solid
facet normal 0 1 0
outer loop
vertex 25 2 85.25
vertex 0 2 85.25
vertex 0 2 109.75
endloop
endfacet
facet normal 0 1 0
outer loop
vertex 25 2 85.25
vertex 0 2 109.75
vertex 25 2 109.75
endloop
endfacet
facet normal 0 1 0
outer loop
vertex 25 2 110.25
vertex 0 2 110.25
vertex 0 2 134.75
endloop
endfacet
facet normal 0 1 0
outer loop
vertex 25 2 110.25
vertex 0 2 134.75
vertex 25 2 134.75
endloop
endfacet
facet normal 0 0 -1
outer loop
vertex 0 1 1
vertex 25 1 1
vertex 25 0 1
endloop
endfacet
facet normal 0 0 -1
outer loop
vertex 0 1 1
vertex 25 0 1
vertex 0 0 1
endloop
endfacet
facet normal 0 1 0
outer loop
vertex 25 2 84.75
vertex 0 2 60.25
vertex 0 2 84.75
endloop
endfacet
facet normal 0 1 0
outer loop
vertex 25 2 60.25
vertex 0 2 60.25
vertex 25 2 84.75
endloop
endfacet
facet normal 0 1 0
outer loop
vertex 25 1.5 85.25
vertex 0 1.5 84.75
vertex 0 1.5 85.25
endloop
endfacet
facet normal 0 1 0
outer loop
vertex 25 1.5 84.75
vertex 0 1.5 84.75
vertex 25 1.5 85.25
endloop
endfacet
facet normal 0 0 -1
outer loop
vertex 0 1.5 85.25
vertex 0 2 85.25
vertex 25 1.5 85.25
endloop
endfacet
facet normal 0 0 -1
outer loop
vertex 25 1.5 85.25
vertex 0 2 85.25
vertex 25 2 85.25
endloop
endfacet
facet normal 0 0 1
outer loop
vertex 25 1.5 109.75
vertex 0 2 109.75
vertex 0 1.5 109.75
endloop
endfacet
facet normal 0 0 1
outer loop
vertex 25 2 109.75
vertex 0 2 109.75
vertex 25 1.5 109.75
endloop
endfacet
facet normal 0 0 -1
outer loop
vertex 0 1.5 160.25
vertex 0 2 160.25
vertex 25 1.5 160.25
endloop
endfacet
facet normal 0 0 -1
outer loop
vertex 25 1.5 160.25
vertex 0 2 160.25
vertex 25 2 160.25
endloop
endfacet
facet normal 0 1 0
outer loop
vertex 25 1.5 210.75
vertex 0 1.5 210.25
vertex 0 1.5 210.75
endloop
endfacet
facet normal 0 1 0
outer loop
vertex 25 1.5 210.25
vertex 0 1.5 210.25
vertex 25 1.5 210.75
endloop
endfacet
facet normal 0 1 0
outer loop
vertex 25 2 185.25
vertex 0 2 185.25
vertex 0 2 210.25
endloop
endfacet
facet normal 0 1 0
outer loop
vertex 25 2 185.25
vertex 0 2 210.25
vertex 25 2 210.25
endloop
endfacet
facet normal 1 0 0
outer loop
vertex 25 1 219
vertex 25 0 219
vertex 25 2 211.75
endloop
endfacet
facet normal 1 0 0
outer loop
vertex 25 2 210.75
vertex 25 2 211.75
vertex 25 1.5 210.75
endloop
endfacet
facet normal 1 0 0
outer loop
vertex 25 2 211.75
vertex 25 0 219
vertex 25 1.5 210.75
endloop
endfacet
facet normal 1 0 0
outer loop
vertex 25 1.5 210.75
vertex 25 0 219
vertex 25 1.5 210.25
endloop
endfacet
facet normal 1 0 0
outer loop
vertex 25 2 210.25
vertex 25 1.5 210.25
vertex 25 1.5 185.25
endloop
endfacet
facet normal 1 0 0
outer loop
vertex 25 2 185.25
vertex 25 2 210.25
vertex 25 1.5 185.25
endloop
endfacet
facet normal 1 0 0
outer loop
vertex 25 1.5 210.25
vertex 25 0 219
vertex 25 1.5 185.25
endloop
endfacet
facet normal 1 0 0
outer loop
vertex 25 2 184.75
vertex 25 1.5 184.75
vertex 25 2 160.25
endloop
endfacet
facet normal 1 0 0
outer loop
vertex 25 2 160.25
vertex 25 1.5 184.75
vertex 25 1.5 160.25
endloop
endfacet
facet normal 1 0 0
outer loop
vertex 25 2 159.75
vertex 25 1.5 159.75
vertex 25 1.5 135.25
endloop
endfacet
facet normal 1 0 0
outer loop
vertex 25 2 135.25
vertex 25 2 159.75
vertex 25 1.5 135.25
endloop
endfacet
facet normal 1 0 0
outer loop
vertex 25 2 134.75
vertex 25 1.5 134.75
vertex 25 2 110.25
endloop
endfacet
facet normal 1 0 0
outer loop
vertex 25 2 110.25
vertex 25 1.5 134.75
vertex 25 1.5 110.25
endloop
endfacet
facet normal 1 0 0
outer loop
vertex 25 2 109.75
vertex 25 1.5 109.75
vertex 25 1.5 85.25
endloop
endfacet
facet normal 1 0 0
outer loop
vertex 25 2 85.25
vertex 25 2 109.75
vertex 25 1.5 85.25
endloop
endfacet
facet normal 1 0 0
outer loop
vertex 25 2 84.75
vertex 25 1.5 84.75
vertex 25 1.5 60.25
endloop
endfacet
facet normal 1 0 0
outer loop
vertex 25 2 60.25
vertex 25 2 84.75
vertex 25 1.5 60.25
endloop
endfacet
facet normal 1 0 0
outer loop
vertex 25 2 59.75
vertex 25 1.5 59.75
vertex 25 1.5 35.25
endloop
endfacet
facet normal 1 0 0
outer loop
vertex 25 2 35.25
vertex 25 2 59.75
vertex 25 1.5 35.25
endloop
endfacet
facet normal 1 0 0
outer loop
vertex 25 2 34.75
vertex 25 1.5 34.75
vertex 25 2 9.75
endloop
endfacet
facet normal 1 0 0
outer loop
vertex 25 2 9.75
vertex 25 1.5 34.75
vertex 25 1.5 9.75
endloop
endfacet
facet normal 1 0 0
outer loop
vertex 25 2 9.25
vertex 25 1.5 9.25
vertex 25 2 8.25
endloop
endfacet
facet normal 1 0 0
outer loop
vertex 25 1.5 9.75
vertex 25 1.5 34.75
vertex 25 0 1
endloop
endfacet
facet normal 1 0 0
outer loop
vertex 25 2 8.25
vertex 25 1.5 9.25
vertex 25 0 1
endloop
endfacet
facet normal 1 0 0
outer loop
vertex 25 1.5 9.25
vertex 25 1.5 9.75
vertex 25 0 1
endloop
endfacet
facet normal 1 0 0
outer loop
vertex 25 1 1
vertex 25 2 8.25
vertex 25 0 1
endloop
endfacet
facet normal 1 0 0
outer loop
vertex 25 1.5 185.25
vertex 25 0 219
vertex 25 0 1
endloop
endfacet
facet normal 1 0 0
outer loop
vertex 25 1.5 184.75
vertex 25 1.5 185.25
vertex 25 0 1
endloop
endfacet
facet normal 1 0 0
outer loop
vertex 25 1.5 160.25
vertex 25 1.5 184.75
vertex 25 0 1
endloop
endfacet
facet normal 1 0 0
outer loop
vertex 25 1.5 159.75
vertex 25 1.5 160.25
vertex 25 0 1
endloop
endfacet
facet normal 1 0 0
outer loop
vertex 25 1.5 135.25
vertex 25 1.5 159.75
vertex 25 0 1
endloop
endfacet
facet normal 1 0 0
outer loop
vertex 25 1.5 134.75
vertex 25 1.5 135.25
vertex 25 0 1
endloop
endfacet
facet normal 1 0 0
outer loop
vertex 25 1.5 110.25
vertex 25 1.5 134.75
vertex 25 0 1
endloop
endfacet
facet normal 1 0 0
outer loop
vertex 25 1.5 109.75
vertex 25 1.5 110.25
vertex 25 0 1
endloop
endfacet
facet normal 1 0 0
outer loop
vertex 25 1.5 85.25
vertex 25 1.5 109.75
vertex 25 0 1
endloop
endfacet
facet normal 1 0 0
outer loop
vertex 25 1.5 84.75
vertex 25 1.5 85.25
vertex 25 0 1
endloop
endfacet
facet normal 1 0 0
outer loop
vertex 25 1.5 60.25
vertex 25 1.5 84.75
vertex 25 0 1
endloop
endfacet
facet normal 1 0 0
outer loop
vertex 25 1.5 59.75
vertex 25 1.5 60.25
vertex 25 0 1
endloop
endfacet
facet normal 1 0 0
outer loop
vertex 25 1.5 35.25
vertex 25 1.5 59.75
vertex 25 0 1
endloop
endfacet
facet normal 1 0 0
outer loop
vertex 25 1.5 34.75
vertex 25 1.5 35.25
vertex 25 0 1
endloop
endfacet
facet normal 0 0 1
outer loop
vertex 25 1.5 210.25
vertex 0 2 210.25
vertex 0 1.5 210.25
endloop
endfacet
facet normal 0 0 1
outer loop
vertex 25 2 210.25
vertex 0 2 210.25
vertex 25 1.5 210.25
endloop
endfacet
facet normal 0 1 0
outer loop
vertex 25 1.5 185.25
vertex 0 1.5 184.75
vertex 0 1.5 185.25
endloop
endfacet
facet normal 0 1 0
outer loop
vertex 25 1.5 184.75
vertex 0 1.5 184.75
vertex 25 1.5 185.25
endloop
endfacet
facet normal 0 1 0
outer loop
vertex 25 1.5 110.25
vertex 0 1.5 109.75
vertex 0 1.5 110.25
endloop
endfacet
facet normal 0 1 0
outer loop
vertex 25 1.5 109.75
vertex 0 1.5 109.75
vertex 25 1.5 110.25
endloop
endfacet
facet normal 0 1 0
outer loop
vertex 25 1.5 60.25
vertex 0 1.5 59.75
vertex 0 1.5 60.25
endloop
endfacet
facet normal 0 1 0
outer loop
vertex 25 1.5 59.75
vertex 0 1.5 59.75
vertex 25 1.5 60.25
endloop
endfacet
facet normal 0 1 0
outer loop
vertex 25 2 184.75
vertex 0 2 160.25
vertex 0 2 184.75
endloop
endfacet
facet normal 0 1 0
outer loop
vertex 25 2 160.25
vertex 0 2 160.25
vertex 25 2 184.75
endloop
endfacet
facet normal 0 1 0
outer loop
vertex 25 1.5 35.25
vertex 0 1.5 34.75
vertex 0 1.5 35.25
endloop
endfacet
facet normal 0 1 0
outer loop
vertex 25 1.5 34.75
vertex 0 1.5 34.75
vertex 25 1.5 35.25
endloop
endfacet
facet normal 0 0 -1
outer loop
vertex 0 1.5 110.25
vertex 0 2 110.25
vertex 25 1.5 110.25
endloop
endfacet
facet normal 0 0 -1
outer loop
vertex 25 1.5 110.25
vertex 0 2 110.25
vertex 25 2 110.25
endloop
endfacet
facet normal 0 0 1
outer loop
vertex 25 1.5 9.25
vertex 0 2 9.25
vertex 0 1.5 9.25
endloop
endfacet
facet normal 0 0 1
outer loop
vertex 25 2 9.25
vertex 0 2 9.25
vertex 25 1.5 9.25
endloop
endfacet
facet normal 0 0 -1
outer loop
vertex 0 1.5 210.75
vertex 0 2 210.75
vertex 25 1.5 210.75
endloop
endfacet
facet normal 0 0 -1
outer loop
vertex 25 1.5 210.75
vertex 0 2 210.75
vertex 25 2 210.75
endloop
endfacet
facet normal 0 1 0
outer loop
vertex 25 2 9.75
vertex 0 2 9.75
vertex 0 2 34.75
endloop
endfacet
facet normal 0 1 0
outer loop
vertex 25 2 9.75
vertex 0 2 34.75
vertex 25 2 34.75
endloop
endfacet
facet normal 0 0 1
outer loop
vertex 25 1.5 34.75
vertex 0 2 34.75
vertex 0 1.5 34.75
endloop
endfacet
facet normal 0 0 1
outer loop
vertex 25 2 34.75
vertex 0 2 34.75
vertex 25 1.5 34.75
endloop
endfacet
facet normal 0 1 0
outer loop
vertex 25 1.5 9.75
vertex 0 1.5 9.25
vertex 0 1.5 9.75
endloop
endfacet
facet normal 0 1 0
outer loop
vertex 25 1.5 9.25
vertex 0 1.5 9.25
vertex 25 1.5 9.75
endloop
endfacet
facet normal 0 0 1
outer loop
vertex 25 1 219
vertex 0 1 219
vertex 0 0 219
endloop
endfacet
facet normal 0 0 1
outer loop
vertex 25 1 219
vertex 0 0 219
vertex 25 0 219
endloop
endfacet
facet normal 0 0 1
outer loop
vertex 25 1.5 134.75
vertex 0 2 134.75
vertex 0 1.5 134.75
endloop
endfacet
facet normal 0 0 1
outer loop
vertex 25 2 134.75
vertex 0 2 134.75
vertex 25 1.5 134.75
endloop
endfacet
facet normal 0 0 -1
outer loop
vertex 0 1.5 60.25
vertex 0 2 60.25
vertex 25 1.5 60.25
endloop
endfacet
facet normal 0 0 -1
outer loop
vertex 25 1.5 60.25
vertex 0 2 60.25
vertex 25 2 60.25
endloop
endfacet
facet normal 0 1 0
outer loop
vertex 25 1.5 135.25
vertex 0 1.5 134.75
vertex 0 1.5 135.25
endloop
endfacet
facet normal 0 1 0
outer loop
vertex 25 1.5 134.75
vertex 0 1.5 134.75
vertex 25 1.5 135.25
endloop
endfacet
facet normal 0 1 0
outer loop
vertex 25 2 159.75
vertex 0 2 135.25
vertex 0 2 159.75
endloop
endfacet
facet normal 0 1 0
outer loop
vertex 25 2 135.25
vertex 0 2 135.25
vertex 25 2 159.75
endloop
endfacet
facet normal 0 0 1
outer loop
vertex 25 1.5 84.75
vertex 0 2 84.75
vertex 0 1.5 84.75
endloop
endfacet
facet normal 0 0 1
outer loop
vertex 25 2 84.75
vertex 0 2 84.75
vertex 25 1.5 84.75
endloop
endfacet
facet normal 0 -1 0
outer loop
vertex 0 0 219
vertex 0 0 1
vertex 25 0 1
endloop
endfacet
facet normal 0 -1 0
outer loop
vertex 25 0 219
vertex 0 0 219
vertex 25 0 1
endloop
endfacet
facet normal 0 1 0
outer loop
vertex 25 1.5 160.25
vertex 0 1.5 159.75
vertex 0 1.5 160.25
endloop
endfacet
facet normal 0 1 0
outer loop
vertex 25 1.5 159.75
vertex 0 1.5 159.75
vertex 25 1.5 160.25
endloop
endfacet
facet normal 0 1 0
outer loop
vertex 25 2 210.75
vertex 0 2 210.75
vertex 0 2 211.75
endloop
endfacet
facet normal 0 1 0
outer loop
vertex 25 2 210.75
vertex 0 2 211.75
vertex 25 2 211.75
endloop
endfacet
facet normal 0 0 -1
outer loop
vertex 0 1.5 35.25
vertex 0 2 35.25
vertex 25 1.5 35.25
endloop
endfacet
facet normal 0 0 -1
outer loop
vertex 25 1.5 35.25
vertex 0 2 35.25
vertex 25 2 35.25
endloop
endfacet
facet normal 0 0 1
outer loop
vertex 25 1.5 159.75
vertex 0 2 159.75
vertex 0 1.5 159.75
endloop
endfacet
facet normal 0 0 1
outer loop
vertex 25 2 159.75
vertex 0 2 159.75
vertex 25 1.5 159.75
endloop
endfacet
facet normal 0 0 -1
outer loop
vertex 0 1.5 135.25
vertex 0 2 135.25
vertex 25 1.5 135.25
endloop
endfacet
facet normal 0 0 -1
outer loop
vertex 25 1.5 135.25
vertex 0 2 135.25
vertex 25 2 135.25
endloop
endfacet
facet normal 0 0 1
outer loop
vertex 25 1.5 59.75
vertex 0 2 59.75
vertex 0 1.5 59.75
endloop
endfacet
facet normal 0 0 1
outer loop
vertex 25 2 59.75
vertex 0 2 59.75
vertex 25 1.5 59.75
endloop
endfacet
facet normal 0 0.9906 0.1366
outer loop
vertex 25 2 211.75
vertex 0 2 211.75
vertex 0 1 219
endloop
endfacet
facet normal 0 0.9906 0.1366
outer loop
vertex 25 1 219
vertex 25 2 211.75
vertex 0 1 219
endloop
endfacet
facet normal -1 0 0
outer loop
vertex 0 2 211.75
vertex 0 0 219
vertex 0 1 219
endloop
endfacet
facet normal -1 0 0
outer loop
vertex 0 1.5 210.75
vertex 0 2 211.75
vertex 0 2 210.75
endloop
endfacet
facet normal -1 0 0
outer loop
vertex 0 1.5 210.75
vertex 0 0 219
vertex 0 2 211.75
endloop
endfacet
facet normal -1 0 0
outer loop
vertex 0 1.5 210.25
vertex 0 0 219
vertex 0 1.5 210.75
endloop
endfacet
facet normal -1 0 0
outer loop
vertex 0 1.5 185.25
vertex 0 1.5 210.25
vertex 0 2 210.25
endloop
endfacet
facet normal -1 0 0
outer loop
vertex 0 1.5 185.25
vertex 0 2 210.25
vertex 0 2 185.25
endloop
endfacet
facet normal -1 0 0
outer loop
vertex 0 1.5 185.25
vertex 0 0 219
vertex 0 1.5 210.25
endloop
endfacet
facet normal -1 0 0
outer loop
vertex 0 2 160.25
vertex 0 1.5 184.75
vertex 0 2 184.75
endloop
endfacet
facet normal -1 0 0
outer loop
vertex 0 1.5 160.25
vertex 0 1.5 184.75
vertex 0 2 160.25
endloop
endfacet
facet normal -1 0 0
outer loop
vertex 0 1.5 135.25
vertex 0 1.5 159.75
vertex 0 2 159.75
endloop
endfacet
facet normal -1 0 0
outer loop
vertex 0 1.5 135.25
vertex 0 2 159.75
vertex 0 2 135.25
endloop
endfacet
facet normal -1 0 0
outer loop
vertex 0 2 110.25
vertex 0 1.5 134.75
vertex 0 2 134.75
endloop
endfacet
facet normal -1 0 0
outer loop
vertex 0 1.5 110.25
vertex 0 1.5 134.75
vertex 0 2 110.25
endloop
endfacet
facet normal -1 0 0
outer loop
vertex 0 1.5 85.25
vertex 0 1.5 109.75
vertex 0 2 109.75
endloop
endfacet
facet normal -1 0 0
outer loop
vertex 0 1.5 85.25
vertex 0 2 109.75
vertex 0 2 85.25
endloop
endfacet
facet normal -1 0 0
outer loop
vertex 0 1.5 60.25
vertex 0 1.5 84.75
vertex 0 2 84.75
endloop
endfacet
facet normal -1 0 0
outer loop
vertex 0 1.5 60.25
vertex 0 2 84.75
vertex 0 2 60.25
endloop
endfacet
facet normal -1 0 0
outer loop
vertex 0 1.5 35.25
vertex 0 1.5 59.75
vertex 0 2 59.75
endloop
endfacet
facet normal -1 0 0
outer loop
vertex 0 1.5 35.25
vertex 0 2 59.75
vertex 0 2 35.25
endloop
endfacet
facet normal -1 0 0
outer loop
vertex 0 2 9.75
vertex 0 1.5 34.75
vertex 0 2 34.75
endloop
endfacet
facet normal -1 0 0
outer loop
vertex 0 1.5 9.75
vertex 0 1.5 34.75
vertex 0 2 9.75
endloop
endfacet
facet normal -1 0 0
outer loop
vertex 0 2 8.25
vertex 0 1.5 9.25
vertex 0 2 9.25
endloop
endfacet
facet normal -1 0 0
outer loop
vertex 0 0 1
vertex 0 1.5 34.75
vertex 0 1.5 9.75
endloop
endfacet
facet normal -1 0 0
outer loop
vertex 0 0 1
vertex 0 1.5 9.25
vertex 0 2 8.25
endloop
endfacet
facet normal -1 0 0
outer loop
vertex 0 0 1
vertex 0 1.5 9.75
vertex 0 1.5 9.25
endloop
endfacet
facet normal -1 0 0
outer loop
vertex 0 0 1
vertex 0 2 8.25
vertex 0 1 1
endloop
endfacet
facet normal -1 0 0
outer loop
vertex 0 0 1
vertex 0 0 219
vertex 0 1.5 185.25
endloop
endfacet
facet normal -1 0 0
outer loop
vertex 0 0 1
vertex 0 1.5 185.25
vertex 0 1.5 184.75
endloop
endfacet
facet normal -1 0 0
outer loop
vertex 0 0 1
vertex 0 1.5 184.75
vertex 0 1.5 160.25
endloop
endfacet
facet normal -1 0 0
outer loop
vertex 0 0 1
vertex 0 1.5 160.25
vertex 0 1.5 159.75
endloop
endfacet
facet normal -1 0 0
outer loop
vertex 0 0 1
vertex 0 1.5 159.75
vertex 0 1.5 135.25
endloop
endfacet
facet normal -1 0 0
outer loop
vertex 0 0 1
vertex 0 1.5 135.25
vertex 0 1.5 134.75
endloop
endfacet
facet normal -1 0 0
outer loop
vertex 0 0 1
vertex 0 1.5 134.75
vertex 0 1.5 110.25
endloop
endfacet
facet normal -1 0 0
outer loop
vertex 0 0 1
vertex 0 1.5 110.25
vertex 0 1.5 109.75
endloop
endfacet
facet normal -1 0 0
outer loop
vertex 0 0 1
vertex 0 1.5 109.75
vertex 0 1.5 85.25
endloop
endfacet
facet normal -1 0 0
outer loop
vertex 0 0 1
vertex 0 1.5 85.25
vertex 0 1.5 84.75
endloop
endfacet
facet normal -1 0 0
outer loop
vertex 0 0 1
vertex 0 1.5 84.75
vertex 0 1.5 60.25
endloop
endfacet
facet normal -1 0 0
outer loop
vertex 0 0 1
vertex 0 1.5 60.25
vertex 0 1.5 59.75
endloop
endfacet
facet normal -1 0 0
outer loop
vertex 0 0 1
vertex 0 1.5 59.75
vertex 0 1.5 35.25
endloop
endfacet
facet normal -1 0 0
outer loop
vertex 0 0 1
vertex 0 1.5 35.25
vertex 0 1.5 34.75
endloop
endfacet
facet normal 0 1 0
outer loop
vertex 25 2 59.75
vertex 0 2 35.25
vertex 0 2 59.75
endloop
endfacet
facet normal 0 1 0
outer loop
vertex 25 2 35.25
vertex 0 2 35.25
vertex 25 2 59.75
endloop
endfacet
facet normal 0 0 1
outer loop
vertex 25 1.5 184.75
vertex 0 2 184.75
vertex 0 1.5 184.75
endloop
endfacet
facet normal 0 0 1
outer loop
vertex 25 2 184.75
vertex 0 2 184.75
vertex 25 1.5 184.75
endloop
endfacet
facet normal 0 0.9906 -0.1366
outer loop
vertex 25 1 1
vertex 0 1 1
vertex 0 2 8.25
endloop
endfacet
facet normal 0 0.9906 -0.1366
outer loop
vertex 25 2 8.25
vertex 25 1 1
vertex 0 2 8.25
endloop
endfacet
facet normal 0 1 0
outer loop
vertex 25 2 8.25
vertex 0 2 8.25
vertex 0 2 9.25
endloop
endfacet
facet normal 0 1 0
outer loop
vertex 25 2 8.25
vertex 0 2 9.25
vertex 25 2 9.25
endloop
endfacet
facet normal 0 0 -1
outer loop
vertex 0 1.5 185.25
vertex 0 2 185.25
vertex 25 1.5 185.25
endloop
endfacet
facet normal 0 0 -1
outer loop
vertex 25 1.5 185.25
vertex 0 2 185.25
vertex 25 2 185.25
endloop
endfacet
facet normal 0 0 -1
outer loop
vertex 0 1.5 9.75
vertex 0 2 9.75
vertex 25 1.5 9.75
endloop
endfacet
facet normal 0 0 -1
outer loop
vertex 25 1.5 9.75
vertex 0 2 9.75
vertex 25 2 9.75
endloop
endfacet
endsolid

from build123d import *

# Parameters (mm, degrees)
SKETCH1_W           = 25
SKETCH1_H           = 220
BOSS_EXTRUDE1_DEPTH = 2
SKETCH2_W           = 25
SKETCH2_H           = 0.5
CUT_EXTRUDE1_DEPTH  = 0.5
SKETCH3_W           = 25
SKETCH3_H           = 2
CUT_EXTRUDE2_DEPTH  = 1
SKETCH4_W           = 25
SKETCH4_H           = 2
CUT_EXTRUDE3_DEPTH  = 1
CUT_EXTRUDE4_DEPTH  = 25


with BuildPart() as part:
    # Sketch1 → Boss-Extrude1 (new body)
    with BuildSketch(Plane(origin=(0, 0, 0), x_dir=(1, 0, 0), z_dir=(0, 1, 0))):
        with Locations((12.5, -110)):
            Rectangle(SKETCH1_W, SKETCH1_H)
    extrude(amount=BOSS_EXTRUDE1_DEPTH)

    # Sketch2 → Cut-Extrude1 (cut)
    with BuildSketch(Plane(origin=(0, 2, 0), x_dir=(1, 0, 0), z_dir=(0, 1, 0))):
        with Locations((12.5, -9.5)):
            Rectangle(SKETCH2_W, SKETCH2_H)
        with Locations((12.5, -210.5)):
            Rectangle(SKETCH2_W, SKETCH2_H)
        with Locations((12.5, -60)):
            Rectangle(SKETCH2_W, SKETCH2_H)
        with Locations((12.5, -35)):
            Rectangle(SKETCH2_W, SKETCH2_H)
        with Locations((12.5, -85)):
            Rectangle(SKETCH2_W, SKETCH2_H)
        with Locations((12.5, -110)):
            Rectangle(SKETCH2_W, SKETCH2_H)
        with Locations((12.5, -135)):
            Rectangle(SKETCH2_W, SKETCH2_H)
        with Locations((12.5, -160)):
            Rectangle(SKETCH2_W, SKETCH2_H)
        with Locations((12.5, -185)):
            Rectangle(SKETCH2_W, SKETCH2_H)
    extrude(amount=-CUT_EXTRUDE1_DEPTH, mode=Mode.SUBTRACT)

    # Sketch3 → Cut-Extrude2 (cut)
    with BuildSketch(Plane(origin=(0, 0, 0), x_dir=(-1, 0, 0), z_dir=(0, 0, -1))):
        with Locations((-12.5, 1)):
            Rectangle(SKETCH3_W, SKETCH3_H)
    extrude(amount=-CUT_EXTRUDE2_DEPTH, mode=Mode.SUBTRACT)

    # Sketch4 → Cut-Extrude3 (cut)
    with BuildSketch(Plane.XY.offset(220)):
        with Locations((12.5, 1)):
            Rectangle(SKETCH4_W, SKETCH4_H)
    extrude(amount=-CUT_EXTRUDE3_DEPTH, mode=Mode.SUBTRACT)

    # Sketch5 → Cut-Extrude4 (cut)
    with BuildSketch(Plane.ZY):
        Polygon((1, 1), (8.25, 2), (1, 2), align=None)
        Polygon((211.75, 2), (219, 1), (219, 2), align=None)
    extrude(amount=-CUT_EXTRUDE4_DEPTH, mode=Mode.SUBTRACT)


solid = part.part
